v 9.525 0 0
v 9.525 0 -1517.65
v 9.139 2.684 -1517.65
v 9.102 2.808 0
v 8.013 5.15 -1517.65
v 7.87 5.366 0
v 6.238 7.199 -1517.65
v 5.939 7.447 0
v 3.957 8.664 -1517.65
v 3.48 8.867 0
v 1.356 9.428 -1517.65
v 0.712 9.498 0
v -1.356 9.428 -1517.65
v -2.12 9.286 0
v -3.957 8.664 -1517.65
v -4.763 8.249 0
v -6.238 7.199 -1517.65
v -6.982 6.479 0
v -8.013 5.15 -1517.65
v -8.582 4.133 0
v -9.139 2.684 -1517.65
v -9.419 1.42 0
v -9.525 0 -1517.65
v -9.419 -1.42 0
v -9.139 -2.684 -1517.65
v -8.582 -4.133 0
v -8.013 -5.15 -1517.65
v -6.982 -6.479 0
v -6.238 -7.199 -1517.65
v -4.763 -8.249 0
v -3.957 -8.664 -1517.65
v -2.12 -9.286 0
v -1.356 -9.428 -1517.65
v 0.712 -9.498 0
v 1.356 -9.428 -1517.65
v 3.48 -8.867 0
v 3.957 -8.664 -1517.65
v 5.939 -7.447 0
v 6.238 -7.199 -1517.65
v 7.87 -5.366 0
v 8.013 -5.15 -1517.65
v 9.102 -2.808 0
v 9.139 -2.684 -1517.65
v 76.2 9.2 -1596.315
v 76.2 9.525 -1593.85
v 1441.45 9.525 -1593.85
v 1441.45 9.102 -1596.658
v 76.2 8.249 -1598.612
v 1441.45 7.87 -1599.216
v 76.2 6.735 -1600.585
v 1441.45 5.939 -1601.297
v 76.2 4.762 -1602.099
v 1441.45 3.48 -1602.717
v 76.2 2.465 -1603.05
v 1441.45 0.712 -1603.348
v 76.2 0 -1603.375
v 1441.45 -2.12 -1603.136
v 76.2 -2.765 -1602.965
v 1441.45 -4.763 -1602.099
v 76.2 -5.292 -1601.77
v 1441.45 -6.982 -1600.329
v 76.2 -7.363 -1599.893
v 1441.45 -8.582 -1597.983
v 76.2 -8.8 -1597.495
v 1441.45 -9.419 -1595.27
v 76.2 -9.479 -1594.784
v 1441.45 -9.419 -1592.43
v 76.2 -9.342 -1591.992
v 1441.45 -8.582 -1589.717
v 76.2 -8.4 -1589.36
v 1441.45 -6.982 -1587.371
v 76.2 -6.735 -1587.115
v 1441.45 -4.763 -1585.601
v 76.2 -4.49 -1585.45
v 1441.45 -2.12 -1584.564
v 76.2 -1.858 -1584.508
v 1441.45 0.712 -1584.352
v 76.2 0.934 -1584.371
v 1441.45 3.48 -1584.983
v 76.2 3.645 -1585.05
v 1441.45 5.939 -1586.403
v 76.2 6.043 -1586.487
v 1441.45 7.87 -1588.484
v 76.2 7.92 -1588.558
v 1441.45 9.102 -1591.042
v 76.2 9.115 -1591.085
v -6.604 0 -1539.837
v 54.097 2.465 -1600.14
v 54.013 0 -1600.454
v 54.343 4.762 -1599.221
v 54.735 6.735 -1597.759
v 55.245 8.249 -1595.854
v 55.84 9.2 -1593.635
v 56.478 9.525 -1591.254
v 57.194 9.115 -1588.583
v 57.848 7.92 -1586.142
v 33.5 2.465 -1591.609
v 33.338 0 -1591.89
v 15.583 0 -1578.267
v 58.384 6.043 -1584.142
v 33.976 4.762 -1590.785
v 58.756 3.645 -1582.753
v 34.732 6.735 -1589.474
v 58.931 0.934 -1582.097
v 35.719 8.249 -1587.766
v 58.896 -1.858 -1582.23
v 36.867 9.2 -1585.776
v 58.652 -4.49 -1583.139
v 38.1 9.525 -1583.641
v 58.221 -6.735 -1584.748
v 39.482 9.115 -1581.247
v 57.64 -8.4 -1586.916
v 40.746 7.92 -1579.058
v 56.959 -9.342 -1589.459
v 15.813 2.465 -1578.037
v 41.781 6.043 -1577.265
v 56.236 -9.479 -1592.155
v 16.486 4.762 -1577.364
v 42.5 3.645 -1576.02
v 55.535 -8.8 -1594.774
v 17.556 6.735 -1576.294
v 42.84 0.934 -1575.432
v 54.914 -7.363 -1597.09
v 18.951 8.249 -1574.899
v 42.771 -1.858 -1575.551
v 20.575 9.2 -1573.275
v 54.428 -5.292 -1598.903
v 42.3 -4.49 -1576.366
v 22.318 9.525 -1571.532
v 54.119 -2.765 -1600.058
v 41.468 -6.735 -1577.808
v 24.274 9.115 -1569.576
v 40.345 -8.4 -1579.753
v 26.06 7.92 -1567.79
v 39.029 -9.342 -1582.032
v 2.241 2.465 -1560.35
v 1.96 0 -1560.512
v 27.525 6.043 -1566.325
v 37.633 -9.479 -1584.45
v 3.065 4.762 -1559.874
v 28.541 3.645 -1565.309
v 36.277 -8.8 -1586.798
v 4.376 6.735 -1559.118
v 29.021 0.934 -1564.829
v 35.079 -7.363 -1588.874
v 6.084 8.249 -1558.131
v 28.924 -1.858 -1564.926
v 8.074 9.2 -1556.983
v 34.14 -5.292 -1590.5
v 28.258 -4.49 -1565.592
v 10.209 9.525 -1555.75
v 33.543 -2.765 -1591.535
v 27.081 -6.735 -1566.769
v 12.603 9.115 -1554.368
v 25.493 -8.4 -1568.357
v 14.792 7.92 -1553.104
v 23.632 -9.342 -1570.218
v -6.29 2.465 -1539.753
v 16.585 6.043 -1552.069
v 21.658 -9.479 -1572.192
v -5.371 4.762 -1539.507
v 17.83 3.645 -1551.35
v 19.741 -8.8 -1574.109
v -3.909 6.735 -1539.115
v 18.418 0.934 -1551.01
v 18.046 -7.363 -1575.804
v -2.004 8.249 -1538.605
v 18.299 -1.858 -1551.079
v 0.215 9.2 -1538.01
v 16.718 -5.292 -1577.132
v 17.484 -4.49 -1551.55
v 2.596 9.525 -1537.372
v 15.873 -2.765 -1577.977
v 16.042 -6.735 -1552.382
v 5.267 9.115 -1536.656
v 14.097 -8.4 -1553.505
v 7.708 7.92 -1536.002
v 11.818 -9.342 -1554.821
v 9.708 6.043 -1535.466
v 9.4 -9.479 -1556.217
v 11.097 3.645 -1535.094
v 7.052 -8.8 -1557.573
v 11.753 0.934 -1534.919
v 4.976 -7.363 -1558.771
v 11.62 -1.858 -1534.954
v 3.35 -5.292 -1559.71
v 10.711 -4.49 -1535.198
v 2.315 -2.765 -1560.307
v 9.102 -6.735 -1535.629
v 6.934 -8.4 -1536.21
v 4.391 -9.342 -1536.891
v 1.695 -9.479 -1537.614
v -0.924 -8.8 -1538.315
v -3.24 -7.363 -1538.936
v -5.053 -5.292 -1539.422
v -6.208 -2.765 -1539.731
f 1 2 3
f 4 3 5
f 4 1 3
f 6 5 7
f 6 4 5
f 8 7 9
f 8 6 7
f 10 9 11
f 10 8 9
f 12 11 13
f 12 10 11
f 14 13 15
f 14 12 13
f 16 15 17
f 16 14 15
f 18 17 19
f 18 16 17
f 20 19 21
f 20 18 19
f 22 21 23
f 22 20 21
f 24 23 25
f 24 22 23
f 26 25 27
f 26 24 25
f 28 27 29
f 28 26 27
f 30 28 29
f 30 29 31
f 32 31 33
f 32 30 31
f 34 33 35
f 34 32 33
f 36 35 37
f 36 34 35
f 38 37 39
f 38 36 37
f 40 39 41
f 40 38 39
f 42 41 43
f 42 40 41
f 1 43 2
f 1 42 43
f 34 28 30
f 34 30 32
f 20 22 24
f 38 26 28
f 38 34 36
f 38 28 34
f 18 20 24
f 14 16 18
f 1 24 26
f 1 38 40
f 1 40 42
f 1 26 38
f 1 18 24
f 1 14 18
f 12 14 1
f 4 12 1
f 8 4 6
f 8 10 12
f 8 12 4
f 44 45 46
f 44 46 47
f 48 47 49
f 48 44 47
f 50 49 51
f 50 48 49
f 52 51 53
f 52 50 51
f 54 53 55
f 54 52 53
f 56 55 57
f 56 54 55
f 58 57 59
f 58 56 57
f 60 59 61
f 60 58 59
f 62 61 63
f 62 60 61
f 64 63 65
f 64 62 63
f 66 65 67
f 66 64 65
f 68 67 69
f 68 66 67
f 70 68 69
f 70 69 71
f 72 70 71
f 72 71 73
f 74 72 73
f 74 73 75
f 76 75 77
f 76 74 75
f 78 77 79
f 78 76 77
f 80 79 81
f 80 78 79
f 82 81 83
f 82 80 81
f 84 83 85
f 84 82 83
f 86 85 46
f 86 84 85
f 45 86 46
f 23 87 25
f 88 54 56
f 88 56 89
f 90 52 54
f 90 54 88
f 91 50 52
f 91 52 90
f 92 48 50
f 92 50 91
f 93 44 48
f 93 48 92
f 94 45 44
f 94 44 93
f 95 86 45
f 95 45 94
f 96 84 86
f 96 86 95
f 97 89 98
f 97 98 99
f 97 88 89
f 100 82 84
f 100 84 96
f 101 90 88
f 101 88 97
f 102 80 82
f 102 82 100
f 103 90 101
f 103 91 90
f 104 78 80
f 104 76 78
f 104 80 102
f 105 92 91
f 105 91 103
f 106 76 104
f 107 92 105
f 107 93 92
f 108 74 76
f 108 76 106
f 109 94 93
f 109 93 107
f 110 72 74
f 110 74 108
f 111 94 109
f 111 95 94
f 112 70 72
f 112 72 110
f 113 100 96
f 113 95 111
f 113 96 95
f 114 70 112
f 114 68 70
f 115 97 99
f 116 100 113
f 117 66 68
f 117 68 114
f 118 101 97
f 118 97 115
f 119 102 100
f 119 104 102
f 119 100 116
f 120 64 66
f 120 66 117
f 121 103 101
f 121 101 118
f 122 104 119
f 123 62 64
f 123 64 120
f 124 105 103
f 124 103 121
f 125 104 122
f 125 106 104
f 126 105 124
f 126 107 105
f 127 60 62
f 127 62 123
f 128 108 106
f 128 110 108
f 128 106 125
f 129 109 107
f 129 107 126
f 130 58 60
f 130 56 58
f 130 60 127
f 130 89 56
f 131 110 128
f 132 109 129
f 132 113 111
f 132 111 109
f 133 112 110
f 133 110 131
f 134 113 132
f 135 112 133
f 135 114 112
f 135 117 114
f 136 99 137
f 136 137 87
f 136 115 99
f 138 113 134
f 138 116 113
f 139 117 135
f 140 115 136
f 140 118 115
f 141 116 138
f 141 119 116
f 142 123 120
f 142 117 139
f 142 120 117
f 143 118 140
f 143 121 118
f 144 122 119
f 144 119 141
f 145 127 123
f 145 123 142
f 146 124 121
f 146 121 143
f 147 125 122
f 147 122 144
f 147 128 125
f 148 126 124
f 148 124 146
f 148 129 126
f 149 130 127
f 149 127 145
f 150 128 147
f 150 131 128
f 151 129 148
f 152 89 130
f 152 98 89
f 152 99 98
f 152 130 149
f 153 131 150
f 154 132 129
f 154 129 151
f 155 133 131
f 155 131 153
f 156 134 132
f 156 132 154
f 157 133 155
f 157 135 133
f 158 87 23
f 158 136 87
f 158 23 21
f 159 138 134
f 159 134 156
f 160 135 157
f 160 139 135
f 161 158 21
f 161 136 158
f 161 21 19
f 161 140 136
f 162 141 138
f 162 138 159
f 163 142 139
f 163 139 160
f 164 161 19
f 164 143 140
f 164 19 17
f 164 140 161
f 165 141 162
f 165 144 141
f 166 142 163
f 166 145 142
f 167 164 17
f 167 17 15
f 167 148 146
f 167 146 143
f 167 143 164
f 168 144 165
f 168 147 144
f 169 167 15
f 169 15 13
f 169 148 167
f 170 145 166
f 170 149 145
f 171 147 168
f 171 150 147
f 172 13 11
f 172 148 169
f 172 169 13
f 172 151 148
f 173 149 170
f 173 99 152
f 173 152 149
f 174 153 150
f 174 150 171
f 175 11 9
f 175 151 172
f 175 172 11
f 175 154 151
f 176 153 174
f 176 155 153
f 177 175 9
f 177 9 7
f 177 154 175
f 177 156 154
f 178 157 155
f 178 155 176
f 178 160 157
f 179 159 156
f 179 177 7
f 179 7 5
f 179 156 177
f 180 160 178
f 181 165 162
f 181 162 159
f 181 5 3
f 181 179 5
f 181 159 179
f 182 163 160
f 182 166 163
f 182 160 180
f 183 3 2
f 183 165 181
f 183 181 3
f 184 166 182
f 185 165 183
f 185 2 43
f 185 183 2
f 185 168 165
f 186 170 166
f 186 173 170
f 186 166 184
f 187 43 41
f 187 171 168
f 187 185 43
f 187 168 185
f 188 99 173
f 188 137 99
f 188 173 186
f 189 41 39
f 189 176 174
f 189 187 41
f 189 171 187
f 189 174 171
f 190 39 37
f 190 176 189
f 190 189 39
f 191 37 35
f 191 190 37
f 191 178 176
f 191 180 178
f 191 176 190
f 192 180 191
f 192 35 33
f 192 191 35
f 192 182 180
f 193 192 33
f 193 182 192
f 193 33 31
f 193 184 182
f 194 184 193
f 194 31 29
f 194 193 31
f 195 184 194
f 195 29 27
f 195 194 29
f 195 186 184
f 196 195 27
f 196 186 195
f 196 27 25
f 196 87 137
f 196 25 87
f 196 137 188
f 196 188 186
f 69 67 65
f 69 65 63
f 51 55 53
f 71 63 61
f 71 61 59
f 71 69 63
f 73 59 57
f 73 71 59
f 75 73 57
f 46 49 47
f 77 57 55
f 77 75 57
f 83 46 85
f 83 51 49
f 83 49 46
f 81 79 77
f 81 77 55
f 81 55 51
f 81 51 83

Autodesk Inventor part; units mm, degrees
ref_plane "XZ Plane" through (0, 0, 0) normal (0, 1, 0) x (-1, 0, 0)
ref_plane "XY Plane" through (0, 0, 0) normal (0, 0, 1) x (1, 0, 0)
sketch "Sketch2" plane through (0, 0, 0) normal (0, 0, 1) x (1, 0, 0)
  circle A0 centre (0, 0) radius 9.525
  dimension "d3" = 19.05
extrude "Extrusion2" add sketch "Sketch2" against normal blind 1517.65
ref_plane "Work Plane1" through (76.2, 0, 0) normal (1, 0, 0) x (0, 1, 0)
sketch "Sketch9" plane through (76.2, 0, 0) normal (1, 0, 0) x (0, 1, 0)
  line L0 (-9.525, -1517.65) -> (9.525, -1517.65) projected
  circle A0 centre (0, -1593.85) radius 9.525
  line L1 (0, -1517.65) -> (0, -1593.85) construction
  point P0 (0, 0)
  dimension "d17" = 19.05
  dimension "d18" = 76.2
extrude "Extrusion4" add sketch "Sketch9" along normal blind 1365.25
sketch "Sketch11" plane through (0, 0, -1517.65) normal (0, 0, -1) x (-1, 0, 0)
  circle A0 centre (0, 0) radius 9.525 projected
sketch "Sketch12" plane through (0, 0, 0) normal (0, 1, 0) x (-1, 0, 0)
  line L0 (-76.2, -1603.375) -> (-76.2, -1584.325) projected
  line L1 (-9.525, -1517.65) -> (9.525, -1517.65) projected
  arc A0 (-76.2, -1593.85) -> (0, -1517.65) centre (-76.2, -1517.65) ccw
  point P0 (0, 0)
  dimension "d21" = 76.2
sweep "Sweep2" add profiles "Sketch11" path "Sketch12" path curves A0
equation "\"d3\" = tubeD"
equation "\"d17\" = tubeD"
equation "\"d18\" = tubeTurnR"
equation "\"d21\" = tubeTurnR"
equation "\"d4\" = tubeTurnR"
equation "\"wallThick\" = 44.45"
equation "\"roomWidth\" = 3048"
equation "\"roomDepth\" = 3657.6"
equation "\"roomHeight\" = 2438.4"
equation "\"doorWidth\" = 895.35"
equation "\"doorHeight\" = 2108.2"
equation "\"doorX\" = 774.7"
equation "\"doorY\" = 88.9"
equation "\"doorLip\" = 76.2"
equation "\"doorThick\" = 57.15"
equation "\"tubeTurnR\" = 76.2"
equation "\"tubeD\" = 19.05"
properties part number "left_tube_0"
